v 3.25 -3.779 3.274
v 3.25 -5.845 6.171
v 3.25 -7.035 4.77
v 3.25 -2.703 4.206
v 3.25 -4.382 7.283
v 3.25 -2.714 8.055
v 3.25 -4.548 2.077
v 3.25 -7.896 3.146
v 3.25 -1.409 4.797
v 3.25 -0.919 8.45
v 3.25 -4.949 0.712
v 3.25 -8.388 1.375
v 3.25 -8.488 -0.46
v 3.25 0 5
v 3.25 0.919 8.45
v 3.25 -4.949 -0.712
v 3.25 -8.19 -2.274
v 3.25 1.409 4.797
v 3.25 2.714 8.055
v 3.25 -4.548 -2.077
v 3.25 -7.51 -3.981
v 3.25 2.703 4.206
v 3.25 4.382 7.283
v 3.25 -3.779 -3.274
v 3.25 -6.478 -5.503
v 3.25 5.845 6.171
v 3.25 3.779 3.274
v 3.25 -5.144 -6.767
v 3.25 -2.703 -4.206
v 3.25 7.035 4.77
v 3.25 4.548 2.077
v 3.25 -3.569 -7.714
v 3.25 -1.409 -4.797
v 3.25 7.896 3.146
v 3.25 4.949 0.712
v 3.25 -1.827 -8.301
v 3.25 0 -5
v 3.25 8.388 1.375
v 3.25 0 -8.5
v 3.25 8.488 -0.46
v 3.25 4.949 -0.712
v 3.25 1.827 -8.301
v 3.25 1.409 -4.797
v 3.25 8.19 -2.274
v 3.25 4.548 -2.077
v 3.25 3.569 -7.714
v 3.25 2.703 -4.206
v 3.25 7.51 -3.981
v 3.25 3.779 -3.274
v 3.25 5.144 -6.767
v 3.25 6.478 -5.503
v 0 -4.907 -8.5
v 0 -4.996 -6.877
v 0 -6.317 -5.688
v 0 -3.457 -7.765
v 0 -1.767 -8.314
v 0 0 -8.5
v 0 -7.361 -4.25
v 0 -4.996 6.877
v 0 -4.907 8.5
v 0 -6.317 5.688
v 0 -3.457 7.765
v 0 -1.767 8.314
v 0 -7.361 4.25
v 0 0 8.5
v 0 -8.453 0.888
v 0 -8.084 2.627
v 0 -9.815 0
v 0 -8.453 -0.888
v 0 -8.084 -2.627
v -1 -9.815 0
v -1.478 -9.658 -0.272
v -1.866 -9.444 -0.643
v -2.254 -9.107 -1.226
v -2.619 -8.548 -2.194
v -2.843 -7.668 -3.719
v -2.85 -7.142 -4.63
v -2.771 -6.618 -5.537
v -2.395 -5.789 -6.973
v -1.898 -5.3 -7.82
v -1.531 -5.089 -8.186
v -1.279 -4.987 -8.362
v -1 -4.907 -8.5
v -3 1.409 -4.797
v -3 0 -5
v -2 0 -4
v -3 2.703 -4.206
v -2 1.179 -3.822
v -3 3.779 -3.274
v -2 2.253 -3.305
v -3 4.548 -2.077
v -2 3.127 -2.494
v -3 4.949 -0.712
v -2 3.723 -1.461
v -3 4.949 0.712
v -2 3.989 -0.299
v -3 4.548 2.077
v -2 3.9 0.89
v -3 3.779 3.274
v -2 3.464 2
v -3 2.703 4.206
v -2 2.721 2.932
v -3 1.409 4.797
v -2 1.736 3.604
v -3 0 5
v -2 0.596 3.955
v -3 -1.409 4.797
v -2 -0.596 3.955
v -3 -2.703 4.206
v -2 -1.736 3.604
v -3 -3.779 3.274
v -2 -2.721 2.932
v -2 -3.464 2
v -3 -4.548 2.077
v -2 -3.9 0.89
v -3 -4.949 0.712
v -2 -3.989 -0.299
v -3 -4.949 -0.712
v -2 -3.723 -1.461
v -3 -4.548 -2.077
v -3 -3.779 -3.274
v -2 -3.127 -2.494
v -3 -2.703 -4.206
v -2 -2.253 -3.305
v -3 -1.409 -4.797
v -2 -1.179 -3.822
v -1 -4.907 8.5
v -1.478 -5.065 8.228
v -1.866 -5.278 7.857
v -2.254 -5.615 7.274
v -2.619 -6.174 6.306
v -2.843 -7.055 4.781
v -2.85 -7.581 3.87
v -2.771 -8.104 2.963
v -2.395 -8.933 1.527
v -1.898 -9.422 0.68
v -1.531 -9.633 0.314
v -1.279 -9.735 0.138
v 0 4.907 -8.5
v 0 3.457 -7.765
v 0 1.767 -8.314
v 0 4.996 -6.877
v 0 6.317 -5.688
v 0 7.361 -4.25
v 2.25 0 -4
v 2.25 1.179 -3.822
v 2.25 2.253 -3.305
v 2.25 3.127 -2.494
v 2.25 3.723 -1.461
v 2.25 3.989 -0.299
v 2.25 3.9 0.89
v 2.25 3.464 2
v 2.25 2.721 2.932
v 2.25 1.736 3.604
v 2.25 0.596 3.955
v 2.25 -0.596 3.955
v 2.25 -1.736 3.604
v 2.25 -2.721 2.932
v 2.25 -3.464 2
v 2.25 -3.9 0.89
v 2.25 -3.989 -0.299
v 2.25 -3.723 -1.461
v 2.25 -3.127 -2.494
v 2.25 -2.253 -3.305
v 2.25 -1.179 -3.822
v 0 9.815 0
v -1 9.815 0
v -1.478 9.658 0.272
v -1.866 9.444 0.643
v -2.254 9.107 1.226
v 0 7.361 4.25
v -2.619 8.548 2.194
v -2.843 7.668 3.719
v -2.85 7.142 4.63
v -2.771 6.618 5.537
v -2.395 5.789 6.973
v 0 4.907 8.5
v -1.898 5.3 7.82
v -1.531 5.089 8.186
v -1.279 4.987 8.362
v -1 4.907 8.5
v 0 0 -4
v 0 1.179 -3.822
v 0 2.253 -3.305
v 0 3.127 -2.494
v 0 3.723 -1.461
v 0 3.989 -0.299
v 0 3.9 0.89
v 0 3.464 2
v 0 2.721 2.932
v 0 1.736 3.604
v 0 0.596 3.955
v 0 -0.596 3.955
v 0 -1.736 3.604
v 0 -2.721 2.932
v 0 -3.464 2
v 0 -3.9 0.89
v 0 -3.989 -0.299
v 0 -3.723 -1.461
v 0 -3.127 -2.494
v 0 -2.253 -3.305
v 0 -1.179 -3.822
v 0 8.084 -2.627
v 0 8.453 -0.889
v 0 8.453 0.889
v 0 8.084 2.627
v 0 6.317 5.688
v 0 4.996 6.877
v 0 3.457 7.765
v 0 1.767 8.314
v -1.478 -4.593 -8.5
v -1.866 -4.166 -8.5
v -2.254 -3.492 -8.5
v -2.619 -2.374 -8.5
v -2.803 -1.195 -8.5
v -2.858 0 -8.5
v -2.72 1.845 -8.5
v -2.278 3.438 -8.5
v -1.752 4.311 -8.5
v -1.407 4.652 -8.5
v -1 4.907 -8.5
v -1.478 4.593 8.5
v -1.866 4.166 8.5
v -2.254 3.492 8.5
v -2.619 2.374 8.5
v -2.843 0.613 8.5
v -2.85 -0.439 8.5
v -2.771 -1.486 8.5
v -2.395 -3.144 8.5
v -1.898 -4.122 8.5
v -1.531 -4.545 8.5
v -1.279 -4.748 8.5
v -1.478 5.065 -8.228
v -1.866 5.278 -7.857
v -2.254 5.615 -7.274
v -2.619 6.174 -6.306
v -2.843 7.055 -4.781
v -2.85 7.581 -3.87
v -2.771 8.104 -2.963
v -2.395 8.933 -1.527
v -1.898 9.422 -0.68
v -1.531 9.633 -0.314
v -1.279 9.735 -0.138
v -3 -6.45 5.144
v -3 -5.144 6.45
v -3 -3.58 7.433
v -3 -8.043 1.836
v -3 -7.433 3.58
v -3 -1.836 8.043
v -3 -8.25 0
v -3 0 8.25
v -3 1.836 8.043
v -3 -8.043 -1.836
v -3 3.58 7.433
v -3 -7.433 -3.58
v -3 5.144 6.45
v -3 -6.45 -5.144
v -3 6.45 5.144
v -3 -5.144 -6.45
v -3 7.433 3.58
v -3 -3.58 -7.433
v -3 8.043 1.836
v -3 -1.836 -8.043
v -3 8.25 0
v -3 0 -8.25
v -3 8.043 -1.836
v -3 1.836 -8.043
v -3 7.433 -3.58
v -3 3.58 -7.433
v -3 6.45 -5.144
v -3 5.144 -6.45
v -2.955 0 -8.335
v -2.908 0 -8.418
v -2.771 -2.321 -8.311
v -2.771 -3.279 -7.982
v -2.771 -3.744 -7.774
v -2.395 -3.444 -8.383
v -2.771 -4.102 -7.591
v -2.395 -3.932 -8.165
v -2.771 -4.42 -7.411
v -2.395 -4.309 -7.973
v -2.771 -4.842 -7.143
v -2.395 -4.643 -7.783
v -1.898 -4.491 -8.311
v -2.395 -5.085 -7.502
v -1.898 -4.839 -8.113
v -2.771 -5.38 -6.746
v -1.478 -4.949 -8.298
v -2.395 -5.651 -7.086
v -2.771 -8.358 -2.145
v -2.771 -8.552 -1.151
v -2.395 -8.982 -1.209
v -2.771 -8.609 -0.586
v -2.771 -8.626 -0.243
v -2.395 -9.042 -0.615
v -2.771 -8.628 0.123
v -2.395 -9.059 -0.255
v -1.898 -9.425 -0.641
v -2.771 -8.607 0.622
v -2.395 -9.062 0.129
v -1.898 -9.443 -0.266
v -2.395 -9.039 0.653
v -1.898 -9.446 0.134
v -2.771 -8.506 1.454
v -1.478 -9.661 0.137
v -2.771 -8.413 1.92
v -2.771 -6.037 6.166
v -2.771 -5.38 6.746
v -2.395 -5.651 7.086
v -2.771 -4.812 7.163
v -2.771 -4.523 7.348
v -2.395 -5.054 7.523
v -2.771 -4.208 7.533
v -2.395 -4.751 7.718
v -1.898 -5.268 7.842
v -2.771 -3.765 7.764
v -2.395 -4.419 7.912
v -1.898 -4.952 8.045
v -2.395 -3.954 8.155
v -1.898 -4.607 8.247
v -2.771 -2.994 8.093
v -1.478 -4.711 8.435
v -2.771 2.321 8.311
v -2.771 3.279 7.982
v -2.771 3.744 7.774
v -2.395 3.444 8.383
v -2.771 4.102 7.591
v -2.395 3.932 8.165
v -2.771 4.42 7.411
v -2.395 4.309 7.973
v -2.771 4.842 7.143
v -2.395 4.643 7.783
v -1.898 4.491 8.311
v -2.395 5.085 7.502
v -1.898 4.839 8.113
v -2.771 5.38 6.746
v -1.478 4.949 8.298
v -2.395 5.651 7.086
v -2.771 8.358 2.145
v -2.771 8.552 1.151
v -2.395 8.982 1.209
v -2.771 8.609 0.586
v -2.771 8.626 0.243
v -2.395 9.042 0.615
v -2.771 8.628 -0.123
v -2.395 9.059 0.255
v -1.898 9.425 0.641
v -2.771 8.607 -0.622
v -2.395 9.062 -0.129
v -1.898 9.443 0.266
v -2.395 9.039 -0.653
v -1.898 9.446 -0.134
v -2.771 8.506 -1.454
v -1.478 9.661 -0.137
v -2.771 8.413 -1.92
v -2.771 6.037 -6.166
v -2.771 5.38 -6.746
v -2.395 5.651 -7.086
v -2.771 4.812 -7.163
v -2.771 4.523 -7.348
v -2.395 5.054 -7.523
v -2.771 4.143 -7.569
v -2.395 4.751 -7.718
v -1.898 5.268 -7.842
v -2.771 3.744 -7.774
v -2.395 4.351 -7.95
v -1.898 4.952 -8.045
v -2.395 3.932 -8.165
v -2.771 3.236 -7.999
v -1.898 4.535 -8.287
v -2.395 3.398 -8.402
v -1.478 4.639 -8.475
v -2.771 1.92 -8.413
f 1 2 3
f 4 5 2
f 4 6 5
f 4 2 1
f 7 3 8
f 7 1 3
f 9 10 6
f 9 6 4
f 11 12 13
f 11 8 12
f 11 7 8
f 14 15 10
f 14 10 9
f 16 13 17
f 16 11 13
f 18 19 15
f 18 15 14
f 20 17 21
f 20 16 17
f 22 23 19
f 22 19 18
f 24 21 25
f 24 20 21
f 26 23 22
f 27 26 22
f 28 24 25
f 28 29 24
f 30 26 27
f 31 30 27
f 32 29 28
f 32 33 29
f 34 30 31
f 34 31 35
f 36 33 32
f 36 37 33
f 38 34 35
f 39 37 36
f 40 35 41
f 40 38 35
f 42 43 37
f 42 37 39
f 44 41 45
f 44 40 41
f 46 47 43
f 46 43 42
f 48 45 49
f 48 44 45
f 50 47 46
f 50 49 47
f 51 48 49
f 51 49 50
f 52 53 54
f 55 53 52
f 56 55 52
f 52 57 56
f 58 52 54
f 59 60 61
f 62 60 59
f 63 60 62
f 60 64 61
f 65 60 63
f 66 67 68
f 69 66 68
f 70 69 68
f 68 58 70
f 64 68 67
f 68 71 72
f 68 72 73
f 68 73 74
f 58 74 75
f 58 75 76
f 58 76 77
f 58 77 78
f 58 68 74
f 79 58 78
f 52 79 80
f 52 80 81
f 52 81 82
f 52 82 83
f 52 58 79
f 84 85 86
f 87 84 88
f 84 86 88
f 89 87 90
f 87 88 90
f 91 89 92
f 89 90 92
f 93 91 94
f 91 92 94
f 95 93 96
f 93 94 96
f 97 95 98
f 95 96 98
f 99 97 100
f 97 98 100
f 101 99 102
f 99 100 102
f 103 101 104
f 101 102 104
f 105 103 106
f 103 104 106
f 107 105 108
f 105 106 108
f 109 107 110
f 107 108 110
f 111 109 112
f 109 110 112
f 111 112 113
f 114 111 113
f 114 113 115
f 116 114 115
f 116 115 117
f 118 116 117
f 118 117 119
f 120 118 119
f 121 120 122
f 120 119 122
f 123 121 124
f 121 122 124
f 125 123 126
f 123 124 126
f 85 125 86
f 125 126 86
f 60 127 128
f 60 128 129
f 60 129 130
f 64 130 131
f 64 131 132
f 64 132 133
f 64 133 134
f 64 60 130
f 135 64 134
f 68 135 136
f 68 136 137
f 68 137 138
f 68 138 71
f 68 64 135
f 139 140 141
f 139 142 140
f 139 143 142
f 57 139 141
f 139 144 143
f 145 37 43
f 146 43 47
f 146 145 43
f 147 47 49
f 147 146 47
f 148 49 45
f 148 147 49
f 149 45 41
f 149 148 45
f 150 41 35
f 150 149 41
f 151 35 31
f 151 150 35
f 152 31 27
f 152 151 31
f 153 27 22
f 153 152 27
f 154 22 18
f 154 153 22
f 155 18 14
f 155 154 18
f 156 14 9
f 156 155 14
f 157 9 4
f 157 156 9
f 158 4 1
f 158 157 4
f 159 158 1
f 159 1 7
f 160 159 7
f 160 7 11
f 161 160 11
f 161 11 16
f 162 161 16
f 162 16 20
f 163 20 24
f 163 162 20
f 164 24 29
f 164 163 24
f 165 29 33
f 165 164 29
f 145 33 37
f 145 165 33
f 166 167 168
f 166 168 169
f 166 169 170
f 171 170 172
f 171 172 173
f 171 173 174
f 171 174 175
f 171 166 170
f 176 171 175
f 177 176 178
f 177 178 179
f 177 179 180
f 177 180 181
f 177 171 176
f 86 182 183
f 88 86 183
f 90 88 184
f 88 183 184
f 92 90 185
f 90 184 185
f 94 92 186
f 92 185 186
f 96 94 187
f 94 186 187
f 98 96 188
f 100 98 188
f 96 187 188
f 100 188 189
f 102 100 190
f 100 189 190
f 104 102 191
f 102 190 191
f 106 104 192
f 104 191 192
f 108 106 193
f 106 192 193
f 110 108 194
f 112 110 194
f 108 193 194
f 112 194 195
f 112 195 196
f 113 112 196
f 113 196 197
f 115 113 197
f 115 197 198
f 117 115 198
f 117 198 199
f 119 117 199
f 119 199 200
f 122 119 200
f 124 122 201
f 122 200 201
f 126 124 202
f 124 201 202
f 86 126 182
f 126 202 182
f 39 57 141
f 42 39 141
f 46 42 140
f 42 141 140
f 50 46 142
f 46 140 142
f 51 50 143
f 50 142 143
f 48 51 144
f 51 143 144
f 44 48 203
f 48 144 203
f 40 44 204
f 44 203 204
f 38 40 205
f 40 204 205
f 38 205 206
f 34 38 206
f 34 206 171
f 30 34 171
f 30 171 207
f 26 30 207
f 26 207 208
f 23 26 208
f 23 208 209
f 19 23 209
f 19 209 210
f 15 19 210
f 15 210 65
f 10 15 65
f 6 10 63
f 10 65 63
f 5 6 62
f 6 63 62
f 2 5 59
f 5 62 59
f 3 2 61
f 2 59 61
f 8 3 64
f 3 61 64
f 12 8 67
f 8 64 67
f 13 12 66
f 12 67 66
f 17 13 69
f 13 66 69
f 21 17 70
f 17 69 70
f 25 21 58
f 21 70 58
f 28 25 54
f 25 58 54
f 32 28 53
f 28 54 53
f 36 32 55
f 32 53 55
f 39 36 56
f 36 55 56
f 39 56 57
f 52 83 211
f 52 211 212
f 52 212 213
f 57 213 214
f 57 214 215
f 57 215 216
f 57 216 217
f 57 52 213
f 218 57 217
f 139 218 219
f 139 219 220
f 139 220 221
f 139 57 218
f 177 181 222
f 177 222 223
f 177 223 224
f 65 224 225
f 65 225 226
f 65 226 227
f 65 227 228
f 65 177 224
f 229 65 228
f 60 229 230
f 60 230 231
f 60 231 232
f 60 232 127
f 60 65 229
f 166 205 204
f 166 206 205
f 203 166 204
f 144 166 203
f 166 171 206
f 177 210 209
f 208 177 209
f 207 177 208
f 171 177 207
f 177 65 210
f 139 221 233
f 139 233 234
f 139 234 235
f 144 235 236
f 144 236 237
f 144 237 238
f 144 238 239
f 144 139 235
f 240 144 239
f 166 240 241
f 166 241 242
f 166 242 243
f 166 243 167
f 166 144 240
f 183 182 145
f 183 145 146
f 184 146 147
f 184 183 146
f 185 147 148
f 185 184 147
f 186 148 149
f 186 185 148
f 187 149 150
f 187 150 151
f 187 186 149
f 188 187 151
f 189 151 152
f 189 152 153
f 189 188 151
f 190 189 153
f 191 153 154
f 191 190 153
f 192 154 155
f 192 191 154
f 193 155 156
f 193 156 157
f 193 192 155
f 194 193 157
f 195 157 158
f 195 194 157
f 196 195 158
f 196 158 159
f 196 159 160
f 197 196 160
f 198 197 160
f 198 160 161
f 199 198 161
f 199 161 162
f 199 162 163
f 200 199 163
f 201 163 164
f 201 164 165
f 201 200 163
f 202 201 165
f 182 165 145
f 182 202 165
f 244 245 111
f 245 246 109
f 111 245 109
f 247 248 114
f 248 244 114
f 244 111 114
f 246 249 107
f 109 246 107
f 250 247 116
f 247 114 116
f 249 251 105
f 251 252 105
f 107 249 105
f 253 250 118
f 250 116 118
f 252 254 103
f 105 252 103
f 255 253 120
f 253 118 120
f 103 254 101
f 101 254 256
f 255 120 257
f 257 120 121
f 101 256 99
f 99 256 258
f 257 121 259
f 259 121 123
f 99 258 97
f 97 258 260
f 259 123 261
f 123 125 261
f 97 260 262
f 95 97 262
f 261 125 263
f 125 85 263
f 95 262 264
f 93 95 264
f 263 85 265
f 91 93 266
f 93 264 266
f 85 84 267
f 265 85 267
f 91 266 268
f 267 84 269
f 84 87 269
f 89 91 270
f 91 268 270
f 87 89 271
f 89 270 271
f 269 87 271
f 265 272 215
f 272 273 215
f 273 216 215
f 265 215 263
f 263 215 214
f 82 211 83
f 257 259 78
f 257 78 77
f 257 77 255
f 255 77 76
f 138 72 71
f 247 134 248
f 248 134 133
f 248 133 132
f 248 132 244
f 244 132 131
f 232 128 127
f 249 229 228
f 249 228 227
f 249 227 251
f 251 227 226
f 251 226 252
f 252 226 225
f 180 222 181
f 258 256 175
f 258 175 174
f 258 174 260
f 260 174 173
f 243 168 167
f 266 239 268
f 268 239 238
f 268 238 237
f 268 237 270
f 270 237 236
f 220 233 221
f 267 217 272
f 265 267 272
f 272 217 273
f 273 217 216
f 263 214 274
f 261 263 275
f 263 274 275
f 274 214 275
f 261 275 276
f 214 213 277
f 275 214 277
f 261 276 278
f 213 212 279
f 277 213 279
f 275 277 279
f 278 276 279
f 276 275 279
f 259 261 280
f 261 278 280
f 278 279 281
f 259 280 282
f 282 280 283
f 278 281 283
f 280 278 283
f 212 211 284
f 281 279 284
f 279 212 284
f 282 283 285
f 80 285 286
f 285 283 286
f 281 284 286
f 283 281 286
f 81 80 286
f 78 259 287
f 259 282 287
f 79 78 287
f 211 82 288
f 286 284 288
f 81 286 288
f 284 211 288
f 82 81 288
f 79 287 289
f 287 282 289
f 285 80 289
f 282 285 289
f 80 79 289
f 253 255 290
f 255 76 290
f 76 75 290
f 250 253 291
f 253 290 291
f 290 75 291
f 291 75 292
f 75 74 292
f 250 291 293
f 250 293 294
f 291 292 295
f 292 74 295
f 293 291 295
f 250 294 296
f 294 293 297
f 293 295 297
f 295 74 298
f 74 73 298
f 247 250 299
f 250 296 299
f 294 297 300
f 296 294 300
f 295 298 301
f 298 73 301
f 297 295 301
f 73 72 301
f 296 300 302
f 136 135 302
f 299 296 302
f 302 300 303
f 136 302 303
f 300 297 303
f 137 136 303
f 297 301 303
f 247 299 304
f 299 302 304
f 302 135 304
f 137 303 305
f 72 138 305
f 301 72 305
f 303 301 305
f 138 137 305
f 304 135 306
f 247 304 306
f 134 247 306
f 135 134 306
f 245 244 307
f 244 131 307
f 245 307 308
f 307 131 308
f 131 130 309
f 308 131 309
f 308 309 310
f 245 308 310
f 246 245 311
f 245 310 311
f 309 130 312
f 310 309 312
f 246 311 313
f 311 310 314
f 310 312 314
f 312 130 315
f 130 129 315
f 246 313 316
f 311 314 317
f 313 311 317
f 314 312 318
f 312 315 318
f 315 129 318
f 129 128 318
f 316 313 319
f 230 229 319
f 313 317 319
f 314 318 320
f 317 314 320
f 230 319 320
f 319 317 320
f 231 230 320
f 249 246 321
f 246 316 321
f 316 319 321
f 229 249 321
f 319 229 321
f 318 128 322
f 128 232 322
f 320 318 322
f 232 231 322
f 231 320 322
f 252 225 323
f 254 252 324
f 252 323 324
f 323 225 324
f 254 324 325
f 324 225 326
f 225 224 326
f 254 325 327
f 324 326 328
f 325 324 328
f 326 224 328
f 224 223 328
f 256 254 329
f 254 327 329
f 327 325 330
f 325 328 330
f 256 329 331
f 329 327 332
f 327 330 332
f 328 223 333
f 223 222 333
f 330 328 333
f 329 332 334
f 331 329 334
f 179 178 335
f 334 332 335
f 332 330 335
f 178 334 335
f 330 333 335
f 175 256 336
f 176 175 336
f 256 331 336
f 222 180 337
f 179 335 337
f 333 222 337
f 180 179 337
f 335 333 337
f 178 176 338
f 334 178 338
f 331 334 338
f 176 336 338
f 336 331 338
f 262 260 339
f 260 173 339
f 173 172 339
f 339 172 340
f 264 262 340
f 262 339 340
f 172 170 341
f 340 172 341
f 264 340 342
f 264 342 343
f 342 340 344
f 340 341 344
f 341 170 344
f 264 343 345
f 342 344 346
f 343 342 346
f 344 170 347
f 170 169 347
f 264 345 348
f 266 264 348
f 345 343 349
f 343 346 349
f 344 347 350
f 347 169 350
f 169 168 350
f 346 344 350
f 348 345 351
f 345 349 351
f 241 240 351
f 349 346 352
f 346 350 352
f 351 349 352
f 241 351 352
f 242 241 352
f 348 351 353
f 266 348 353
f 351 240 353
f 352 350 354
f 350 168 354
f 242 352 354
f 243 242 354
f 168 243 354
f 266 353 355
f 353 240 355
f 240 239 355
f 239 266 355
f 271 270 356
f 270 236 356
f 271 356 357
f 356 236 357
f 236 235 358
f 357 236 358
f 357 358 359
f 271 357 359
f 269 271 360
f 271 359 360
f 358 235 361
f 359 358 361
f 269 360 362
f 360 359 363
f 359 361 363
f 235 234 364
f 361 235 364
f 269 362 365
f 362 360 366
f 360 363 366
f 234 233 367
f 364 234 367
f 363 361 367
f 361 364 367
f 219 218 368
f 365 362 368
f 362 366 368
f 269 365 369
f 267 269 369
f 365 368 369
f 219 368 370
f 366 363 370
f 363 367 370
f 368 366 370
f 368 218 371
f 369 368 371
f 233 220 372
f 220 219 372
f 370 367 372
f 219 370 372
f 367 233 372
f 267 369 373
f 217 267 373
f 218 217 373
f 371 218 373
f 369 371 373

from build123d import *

# Parameters (mm, degrees)
ESQUISSE2_R             = 4
EXTRUSION1_DEPTH        = 3.25
EXTRUSION1_DEPTH_BACK   = 3
ESQUISSE3_OUTSIDE_W     = 24.342
ESQUISSE3_OUTSIDE_H     = 26.972
ESQUISSE3_OUTSIDE_R     = 8.5
ENL_V_MAT_EXTRU_1_DEPTH = 4.25
CHANFREIN1_SIZE         = 1


with BuildPart() as part:
    # Esquisse2 → Extrusion1 (new body, two sides)
    with BuildSketch(Plane(origin=(0, 0, 0), x_dir=(0, 0, -1), z_dir=(1, 0, 0))) as extrusion1_sk:
        Polygon((0, 9.814954576), (-8.5, 4.907477288), (-8.5, -4.907477288), (0, -9.814954576), (8.5, -4.907477288), (8.5, 4.907477288), align=None)
        Circle(ESQUISSE2_R, mode=Mode.SUBTRACT)
    extrude(amount=EXTRUSION1_DEPTH)
    extrude(extrusion1_sk.sketch, amount=-EXTRUSION1_DEPTH_BACK)

    # Esquisse3 outside → Enlèv. mat.-Extru.1 (cut, through all)
    with BuildSketch(Plane(origin=(0, 0, 0), x_dir=(0, 0, -1), z_dir=(1, 0, 0))):
        Rectangle(ESQUISSE3_OUTSIDE_W, ESQUISSE3_OUTSIDE_H)
        Circle(ESQUISSE3_OUTSIDE_R, mode=Mode.SUBTRACT)
    extrude(amount=ENL_V_MAT_EXTRU_1_DEPTH, mode=Mode.SUBTRACT)

    # Esquisse4 → Enlèvement de matière-Révolution1 (revolve, cut)
    with BuildSketch(Plane.XY, mode=Mode.PRIVATE) as enl_vement_de_mati_re_r_volution1_sk:
        with BuildLine():
            Line((-1, 9.814954576), (-3, 9.814954576))
            Line((-3, 9.814954576), (-3, 8.25))
            ThreePointArc((-3, 8.25), (-2.173757557, 9.25453812), (-1, 9.814954576))
        make_face()
    revolve(enl_vement_de_mati_re_r_volution1_sk.sketch.rotate(Axis((0, 0, 0), (-1, 0, 0)), 90), axis=Axis((0, 0, 0), (-1, 0, 0)), mode=Mode.SUBTRACT)  # turned: the seam where the file's is

    # Chanfrein1
    chanfrein1_edges = [part.edges().sort_by_distance(p)[0] for p in [
        (3.25, 0, 4),
        (-3, 0, 4),
    ]]
    chamfer(chanfrein1_edges, length=CHANFREIN1_SIZE)


solid = part.part
